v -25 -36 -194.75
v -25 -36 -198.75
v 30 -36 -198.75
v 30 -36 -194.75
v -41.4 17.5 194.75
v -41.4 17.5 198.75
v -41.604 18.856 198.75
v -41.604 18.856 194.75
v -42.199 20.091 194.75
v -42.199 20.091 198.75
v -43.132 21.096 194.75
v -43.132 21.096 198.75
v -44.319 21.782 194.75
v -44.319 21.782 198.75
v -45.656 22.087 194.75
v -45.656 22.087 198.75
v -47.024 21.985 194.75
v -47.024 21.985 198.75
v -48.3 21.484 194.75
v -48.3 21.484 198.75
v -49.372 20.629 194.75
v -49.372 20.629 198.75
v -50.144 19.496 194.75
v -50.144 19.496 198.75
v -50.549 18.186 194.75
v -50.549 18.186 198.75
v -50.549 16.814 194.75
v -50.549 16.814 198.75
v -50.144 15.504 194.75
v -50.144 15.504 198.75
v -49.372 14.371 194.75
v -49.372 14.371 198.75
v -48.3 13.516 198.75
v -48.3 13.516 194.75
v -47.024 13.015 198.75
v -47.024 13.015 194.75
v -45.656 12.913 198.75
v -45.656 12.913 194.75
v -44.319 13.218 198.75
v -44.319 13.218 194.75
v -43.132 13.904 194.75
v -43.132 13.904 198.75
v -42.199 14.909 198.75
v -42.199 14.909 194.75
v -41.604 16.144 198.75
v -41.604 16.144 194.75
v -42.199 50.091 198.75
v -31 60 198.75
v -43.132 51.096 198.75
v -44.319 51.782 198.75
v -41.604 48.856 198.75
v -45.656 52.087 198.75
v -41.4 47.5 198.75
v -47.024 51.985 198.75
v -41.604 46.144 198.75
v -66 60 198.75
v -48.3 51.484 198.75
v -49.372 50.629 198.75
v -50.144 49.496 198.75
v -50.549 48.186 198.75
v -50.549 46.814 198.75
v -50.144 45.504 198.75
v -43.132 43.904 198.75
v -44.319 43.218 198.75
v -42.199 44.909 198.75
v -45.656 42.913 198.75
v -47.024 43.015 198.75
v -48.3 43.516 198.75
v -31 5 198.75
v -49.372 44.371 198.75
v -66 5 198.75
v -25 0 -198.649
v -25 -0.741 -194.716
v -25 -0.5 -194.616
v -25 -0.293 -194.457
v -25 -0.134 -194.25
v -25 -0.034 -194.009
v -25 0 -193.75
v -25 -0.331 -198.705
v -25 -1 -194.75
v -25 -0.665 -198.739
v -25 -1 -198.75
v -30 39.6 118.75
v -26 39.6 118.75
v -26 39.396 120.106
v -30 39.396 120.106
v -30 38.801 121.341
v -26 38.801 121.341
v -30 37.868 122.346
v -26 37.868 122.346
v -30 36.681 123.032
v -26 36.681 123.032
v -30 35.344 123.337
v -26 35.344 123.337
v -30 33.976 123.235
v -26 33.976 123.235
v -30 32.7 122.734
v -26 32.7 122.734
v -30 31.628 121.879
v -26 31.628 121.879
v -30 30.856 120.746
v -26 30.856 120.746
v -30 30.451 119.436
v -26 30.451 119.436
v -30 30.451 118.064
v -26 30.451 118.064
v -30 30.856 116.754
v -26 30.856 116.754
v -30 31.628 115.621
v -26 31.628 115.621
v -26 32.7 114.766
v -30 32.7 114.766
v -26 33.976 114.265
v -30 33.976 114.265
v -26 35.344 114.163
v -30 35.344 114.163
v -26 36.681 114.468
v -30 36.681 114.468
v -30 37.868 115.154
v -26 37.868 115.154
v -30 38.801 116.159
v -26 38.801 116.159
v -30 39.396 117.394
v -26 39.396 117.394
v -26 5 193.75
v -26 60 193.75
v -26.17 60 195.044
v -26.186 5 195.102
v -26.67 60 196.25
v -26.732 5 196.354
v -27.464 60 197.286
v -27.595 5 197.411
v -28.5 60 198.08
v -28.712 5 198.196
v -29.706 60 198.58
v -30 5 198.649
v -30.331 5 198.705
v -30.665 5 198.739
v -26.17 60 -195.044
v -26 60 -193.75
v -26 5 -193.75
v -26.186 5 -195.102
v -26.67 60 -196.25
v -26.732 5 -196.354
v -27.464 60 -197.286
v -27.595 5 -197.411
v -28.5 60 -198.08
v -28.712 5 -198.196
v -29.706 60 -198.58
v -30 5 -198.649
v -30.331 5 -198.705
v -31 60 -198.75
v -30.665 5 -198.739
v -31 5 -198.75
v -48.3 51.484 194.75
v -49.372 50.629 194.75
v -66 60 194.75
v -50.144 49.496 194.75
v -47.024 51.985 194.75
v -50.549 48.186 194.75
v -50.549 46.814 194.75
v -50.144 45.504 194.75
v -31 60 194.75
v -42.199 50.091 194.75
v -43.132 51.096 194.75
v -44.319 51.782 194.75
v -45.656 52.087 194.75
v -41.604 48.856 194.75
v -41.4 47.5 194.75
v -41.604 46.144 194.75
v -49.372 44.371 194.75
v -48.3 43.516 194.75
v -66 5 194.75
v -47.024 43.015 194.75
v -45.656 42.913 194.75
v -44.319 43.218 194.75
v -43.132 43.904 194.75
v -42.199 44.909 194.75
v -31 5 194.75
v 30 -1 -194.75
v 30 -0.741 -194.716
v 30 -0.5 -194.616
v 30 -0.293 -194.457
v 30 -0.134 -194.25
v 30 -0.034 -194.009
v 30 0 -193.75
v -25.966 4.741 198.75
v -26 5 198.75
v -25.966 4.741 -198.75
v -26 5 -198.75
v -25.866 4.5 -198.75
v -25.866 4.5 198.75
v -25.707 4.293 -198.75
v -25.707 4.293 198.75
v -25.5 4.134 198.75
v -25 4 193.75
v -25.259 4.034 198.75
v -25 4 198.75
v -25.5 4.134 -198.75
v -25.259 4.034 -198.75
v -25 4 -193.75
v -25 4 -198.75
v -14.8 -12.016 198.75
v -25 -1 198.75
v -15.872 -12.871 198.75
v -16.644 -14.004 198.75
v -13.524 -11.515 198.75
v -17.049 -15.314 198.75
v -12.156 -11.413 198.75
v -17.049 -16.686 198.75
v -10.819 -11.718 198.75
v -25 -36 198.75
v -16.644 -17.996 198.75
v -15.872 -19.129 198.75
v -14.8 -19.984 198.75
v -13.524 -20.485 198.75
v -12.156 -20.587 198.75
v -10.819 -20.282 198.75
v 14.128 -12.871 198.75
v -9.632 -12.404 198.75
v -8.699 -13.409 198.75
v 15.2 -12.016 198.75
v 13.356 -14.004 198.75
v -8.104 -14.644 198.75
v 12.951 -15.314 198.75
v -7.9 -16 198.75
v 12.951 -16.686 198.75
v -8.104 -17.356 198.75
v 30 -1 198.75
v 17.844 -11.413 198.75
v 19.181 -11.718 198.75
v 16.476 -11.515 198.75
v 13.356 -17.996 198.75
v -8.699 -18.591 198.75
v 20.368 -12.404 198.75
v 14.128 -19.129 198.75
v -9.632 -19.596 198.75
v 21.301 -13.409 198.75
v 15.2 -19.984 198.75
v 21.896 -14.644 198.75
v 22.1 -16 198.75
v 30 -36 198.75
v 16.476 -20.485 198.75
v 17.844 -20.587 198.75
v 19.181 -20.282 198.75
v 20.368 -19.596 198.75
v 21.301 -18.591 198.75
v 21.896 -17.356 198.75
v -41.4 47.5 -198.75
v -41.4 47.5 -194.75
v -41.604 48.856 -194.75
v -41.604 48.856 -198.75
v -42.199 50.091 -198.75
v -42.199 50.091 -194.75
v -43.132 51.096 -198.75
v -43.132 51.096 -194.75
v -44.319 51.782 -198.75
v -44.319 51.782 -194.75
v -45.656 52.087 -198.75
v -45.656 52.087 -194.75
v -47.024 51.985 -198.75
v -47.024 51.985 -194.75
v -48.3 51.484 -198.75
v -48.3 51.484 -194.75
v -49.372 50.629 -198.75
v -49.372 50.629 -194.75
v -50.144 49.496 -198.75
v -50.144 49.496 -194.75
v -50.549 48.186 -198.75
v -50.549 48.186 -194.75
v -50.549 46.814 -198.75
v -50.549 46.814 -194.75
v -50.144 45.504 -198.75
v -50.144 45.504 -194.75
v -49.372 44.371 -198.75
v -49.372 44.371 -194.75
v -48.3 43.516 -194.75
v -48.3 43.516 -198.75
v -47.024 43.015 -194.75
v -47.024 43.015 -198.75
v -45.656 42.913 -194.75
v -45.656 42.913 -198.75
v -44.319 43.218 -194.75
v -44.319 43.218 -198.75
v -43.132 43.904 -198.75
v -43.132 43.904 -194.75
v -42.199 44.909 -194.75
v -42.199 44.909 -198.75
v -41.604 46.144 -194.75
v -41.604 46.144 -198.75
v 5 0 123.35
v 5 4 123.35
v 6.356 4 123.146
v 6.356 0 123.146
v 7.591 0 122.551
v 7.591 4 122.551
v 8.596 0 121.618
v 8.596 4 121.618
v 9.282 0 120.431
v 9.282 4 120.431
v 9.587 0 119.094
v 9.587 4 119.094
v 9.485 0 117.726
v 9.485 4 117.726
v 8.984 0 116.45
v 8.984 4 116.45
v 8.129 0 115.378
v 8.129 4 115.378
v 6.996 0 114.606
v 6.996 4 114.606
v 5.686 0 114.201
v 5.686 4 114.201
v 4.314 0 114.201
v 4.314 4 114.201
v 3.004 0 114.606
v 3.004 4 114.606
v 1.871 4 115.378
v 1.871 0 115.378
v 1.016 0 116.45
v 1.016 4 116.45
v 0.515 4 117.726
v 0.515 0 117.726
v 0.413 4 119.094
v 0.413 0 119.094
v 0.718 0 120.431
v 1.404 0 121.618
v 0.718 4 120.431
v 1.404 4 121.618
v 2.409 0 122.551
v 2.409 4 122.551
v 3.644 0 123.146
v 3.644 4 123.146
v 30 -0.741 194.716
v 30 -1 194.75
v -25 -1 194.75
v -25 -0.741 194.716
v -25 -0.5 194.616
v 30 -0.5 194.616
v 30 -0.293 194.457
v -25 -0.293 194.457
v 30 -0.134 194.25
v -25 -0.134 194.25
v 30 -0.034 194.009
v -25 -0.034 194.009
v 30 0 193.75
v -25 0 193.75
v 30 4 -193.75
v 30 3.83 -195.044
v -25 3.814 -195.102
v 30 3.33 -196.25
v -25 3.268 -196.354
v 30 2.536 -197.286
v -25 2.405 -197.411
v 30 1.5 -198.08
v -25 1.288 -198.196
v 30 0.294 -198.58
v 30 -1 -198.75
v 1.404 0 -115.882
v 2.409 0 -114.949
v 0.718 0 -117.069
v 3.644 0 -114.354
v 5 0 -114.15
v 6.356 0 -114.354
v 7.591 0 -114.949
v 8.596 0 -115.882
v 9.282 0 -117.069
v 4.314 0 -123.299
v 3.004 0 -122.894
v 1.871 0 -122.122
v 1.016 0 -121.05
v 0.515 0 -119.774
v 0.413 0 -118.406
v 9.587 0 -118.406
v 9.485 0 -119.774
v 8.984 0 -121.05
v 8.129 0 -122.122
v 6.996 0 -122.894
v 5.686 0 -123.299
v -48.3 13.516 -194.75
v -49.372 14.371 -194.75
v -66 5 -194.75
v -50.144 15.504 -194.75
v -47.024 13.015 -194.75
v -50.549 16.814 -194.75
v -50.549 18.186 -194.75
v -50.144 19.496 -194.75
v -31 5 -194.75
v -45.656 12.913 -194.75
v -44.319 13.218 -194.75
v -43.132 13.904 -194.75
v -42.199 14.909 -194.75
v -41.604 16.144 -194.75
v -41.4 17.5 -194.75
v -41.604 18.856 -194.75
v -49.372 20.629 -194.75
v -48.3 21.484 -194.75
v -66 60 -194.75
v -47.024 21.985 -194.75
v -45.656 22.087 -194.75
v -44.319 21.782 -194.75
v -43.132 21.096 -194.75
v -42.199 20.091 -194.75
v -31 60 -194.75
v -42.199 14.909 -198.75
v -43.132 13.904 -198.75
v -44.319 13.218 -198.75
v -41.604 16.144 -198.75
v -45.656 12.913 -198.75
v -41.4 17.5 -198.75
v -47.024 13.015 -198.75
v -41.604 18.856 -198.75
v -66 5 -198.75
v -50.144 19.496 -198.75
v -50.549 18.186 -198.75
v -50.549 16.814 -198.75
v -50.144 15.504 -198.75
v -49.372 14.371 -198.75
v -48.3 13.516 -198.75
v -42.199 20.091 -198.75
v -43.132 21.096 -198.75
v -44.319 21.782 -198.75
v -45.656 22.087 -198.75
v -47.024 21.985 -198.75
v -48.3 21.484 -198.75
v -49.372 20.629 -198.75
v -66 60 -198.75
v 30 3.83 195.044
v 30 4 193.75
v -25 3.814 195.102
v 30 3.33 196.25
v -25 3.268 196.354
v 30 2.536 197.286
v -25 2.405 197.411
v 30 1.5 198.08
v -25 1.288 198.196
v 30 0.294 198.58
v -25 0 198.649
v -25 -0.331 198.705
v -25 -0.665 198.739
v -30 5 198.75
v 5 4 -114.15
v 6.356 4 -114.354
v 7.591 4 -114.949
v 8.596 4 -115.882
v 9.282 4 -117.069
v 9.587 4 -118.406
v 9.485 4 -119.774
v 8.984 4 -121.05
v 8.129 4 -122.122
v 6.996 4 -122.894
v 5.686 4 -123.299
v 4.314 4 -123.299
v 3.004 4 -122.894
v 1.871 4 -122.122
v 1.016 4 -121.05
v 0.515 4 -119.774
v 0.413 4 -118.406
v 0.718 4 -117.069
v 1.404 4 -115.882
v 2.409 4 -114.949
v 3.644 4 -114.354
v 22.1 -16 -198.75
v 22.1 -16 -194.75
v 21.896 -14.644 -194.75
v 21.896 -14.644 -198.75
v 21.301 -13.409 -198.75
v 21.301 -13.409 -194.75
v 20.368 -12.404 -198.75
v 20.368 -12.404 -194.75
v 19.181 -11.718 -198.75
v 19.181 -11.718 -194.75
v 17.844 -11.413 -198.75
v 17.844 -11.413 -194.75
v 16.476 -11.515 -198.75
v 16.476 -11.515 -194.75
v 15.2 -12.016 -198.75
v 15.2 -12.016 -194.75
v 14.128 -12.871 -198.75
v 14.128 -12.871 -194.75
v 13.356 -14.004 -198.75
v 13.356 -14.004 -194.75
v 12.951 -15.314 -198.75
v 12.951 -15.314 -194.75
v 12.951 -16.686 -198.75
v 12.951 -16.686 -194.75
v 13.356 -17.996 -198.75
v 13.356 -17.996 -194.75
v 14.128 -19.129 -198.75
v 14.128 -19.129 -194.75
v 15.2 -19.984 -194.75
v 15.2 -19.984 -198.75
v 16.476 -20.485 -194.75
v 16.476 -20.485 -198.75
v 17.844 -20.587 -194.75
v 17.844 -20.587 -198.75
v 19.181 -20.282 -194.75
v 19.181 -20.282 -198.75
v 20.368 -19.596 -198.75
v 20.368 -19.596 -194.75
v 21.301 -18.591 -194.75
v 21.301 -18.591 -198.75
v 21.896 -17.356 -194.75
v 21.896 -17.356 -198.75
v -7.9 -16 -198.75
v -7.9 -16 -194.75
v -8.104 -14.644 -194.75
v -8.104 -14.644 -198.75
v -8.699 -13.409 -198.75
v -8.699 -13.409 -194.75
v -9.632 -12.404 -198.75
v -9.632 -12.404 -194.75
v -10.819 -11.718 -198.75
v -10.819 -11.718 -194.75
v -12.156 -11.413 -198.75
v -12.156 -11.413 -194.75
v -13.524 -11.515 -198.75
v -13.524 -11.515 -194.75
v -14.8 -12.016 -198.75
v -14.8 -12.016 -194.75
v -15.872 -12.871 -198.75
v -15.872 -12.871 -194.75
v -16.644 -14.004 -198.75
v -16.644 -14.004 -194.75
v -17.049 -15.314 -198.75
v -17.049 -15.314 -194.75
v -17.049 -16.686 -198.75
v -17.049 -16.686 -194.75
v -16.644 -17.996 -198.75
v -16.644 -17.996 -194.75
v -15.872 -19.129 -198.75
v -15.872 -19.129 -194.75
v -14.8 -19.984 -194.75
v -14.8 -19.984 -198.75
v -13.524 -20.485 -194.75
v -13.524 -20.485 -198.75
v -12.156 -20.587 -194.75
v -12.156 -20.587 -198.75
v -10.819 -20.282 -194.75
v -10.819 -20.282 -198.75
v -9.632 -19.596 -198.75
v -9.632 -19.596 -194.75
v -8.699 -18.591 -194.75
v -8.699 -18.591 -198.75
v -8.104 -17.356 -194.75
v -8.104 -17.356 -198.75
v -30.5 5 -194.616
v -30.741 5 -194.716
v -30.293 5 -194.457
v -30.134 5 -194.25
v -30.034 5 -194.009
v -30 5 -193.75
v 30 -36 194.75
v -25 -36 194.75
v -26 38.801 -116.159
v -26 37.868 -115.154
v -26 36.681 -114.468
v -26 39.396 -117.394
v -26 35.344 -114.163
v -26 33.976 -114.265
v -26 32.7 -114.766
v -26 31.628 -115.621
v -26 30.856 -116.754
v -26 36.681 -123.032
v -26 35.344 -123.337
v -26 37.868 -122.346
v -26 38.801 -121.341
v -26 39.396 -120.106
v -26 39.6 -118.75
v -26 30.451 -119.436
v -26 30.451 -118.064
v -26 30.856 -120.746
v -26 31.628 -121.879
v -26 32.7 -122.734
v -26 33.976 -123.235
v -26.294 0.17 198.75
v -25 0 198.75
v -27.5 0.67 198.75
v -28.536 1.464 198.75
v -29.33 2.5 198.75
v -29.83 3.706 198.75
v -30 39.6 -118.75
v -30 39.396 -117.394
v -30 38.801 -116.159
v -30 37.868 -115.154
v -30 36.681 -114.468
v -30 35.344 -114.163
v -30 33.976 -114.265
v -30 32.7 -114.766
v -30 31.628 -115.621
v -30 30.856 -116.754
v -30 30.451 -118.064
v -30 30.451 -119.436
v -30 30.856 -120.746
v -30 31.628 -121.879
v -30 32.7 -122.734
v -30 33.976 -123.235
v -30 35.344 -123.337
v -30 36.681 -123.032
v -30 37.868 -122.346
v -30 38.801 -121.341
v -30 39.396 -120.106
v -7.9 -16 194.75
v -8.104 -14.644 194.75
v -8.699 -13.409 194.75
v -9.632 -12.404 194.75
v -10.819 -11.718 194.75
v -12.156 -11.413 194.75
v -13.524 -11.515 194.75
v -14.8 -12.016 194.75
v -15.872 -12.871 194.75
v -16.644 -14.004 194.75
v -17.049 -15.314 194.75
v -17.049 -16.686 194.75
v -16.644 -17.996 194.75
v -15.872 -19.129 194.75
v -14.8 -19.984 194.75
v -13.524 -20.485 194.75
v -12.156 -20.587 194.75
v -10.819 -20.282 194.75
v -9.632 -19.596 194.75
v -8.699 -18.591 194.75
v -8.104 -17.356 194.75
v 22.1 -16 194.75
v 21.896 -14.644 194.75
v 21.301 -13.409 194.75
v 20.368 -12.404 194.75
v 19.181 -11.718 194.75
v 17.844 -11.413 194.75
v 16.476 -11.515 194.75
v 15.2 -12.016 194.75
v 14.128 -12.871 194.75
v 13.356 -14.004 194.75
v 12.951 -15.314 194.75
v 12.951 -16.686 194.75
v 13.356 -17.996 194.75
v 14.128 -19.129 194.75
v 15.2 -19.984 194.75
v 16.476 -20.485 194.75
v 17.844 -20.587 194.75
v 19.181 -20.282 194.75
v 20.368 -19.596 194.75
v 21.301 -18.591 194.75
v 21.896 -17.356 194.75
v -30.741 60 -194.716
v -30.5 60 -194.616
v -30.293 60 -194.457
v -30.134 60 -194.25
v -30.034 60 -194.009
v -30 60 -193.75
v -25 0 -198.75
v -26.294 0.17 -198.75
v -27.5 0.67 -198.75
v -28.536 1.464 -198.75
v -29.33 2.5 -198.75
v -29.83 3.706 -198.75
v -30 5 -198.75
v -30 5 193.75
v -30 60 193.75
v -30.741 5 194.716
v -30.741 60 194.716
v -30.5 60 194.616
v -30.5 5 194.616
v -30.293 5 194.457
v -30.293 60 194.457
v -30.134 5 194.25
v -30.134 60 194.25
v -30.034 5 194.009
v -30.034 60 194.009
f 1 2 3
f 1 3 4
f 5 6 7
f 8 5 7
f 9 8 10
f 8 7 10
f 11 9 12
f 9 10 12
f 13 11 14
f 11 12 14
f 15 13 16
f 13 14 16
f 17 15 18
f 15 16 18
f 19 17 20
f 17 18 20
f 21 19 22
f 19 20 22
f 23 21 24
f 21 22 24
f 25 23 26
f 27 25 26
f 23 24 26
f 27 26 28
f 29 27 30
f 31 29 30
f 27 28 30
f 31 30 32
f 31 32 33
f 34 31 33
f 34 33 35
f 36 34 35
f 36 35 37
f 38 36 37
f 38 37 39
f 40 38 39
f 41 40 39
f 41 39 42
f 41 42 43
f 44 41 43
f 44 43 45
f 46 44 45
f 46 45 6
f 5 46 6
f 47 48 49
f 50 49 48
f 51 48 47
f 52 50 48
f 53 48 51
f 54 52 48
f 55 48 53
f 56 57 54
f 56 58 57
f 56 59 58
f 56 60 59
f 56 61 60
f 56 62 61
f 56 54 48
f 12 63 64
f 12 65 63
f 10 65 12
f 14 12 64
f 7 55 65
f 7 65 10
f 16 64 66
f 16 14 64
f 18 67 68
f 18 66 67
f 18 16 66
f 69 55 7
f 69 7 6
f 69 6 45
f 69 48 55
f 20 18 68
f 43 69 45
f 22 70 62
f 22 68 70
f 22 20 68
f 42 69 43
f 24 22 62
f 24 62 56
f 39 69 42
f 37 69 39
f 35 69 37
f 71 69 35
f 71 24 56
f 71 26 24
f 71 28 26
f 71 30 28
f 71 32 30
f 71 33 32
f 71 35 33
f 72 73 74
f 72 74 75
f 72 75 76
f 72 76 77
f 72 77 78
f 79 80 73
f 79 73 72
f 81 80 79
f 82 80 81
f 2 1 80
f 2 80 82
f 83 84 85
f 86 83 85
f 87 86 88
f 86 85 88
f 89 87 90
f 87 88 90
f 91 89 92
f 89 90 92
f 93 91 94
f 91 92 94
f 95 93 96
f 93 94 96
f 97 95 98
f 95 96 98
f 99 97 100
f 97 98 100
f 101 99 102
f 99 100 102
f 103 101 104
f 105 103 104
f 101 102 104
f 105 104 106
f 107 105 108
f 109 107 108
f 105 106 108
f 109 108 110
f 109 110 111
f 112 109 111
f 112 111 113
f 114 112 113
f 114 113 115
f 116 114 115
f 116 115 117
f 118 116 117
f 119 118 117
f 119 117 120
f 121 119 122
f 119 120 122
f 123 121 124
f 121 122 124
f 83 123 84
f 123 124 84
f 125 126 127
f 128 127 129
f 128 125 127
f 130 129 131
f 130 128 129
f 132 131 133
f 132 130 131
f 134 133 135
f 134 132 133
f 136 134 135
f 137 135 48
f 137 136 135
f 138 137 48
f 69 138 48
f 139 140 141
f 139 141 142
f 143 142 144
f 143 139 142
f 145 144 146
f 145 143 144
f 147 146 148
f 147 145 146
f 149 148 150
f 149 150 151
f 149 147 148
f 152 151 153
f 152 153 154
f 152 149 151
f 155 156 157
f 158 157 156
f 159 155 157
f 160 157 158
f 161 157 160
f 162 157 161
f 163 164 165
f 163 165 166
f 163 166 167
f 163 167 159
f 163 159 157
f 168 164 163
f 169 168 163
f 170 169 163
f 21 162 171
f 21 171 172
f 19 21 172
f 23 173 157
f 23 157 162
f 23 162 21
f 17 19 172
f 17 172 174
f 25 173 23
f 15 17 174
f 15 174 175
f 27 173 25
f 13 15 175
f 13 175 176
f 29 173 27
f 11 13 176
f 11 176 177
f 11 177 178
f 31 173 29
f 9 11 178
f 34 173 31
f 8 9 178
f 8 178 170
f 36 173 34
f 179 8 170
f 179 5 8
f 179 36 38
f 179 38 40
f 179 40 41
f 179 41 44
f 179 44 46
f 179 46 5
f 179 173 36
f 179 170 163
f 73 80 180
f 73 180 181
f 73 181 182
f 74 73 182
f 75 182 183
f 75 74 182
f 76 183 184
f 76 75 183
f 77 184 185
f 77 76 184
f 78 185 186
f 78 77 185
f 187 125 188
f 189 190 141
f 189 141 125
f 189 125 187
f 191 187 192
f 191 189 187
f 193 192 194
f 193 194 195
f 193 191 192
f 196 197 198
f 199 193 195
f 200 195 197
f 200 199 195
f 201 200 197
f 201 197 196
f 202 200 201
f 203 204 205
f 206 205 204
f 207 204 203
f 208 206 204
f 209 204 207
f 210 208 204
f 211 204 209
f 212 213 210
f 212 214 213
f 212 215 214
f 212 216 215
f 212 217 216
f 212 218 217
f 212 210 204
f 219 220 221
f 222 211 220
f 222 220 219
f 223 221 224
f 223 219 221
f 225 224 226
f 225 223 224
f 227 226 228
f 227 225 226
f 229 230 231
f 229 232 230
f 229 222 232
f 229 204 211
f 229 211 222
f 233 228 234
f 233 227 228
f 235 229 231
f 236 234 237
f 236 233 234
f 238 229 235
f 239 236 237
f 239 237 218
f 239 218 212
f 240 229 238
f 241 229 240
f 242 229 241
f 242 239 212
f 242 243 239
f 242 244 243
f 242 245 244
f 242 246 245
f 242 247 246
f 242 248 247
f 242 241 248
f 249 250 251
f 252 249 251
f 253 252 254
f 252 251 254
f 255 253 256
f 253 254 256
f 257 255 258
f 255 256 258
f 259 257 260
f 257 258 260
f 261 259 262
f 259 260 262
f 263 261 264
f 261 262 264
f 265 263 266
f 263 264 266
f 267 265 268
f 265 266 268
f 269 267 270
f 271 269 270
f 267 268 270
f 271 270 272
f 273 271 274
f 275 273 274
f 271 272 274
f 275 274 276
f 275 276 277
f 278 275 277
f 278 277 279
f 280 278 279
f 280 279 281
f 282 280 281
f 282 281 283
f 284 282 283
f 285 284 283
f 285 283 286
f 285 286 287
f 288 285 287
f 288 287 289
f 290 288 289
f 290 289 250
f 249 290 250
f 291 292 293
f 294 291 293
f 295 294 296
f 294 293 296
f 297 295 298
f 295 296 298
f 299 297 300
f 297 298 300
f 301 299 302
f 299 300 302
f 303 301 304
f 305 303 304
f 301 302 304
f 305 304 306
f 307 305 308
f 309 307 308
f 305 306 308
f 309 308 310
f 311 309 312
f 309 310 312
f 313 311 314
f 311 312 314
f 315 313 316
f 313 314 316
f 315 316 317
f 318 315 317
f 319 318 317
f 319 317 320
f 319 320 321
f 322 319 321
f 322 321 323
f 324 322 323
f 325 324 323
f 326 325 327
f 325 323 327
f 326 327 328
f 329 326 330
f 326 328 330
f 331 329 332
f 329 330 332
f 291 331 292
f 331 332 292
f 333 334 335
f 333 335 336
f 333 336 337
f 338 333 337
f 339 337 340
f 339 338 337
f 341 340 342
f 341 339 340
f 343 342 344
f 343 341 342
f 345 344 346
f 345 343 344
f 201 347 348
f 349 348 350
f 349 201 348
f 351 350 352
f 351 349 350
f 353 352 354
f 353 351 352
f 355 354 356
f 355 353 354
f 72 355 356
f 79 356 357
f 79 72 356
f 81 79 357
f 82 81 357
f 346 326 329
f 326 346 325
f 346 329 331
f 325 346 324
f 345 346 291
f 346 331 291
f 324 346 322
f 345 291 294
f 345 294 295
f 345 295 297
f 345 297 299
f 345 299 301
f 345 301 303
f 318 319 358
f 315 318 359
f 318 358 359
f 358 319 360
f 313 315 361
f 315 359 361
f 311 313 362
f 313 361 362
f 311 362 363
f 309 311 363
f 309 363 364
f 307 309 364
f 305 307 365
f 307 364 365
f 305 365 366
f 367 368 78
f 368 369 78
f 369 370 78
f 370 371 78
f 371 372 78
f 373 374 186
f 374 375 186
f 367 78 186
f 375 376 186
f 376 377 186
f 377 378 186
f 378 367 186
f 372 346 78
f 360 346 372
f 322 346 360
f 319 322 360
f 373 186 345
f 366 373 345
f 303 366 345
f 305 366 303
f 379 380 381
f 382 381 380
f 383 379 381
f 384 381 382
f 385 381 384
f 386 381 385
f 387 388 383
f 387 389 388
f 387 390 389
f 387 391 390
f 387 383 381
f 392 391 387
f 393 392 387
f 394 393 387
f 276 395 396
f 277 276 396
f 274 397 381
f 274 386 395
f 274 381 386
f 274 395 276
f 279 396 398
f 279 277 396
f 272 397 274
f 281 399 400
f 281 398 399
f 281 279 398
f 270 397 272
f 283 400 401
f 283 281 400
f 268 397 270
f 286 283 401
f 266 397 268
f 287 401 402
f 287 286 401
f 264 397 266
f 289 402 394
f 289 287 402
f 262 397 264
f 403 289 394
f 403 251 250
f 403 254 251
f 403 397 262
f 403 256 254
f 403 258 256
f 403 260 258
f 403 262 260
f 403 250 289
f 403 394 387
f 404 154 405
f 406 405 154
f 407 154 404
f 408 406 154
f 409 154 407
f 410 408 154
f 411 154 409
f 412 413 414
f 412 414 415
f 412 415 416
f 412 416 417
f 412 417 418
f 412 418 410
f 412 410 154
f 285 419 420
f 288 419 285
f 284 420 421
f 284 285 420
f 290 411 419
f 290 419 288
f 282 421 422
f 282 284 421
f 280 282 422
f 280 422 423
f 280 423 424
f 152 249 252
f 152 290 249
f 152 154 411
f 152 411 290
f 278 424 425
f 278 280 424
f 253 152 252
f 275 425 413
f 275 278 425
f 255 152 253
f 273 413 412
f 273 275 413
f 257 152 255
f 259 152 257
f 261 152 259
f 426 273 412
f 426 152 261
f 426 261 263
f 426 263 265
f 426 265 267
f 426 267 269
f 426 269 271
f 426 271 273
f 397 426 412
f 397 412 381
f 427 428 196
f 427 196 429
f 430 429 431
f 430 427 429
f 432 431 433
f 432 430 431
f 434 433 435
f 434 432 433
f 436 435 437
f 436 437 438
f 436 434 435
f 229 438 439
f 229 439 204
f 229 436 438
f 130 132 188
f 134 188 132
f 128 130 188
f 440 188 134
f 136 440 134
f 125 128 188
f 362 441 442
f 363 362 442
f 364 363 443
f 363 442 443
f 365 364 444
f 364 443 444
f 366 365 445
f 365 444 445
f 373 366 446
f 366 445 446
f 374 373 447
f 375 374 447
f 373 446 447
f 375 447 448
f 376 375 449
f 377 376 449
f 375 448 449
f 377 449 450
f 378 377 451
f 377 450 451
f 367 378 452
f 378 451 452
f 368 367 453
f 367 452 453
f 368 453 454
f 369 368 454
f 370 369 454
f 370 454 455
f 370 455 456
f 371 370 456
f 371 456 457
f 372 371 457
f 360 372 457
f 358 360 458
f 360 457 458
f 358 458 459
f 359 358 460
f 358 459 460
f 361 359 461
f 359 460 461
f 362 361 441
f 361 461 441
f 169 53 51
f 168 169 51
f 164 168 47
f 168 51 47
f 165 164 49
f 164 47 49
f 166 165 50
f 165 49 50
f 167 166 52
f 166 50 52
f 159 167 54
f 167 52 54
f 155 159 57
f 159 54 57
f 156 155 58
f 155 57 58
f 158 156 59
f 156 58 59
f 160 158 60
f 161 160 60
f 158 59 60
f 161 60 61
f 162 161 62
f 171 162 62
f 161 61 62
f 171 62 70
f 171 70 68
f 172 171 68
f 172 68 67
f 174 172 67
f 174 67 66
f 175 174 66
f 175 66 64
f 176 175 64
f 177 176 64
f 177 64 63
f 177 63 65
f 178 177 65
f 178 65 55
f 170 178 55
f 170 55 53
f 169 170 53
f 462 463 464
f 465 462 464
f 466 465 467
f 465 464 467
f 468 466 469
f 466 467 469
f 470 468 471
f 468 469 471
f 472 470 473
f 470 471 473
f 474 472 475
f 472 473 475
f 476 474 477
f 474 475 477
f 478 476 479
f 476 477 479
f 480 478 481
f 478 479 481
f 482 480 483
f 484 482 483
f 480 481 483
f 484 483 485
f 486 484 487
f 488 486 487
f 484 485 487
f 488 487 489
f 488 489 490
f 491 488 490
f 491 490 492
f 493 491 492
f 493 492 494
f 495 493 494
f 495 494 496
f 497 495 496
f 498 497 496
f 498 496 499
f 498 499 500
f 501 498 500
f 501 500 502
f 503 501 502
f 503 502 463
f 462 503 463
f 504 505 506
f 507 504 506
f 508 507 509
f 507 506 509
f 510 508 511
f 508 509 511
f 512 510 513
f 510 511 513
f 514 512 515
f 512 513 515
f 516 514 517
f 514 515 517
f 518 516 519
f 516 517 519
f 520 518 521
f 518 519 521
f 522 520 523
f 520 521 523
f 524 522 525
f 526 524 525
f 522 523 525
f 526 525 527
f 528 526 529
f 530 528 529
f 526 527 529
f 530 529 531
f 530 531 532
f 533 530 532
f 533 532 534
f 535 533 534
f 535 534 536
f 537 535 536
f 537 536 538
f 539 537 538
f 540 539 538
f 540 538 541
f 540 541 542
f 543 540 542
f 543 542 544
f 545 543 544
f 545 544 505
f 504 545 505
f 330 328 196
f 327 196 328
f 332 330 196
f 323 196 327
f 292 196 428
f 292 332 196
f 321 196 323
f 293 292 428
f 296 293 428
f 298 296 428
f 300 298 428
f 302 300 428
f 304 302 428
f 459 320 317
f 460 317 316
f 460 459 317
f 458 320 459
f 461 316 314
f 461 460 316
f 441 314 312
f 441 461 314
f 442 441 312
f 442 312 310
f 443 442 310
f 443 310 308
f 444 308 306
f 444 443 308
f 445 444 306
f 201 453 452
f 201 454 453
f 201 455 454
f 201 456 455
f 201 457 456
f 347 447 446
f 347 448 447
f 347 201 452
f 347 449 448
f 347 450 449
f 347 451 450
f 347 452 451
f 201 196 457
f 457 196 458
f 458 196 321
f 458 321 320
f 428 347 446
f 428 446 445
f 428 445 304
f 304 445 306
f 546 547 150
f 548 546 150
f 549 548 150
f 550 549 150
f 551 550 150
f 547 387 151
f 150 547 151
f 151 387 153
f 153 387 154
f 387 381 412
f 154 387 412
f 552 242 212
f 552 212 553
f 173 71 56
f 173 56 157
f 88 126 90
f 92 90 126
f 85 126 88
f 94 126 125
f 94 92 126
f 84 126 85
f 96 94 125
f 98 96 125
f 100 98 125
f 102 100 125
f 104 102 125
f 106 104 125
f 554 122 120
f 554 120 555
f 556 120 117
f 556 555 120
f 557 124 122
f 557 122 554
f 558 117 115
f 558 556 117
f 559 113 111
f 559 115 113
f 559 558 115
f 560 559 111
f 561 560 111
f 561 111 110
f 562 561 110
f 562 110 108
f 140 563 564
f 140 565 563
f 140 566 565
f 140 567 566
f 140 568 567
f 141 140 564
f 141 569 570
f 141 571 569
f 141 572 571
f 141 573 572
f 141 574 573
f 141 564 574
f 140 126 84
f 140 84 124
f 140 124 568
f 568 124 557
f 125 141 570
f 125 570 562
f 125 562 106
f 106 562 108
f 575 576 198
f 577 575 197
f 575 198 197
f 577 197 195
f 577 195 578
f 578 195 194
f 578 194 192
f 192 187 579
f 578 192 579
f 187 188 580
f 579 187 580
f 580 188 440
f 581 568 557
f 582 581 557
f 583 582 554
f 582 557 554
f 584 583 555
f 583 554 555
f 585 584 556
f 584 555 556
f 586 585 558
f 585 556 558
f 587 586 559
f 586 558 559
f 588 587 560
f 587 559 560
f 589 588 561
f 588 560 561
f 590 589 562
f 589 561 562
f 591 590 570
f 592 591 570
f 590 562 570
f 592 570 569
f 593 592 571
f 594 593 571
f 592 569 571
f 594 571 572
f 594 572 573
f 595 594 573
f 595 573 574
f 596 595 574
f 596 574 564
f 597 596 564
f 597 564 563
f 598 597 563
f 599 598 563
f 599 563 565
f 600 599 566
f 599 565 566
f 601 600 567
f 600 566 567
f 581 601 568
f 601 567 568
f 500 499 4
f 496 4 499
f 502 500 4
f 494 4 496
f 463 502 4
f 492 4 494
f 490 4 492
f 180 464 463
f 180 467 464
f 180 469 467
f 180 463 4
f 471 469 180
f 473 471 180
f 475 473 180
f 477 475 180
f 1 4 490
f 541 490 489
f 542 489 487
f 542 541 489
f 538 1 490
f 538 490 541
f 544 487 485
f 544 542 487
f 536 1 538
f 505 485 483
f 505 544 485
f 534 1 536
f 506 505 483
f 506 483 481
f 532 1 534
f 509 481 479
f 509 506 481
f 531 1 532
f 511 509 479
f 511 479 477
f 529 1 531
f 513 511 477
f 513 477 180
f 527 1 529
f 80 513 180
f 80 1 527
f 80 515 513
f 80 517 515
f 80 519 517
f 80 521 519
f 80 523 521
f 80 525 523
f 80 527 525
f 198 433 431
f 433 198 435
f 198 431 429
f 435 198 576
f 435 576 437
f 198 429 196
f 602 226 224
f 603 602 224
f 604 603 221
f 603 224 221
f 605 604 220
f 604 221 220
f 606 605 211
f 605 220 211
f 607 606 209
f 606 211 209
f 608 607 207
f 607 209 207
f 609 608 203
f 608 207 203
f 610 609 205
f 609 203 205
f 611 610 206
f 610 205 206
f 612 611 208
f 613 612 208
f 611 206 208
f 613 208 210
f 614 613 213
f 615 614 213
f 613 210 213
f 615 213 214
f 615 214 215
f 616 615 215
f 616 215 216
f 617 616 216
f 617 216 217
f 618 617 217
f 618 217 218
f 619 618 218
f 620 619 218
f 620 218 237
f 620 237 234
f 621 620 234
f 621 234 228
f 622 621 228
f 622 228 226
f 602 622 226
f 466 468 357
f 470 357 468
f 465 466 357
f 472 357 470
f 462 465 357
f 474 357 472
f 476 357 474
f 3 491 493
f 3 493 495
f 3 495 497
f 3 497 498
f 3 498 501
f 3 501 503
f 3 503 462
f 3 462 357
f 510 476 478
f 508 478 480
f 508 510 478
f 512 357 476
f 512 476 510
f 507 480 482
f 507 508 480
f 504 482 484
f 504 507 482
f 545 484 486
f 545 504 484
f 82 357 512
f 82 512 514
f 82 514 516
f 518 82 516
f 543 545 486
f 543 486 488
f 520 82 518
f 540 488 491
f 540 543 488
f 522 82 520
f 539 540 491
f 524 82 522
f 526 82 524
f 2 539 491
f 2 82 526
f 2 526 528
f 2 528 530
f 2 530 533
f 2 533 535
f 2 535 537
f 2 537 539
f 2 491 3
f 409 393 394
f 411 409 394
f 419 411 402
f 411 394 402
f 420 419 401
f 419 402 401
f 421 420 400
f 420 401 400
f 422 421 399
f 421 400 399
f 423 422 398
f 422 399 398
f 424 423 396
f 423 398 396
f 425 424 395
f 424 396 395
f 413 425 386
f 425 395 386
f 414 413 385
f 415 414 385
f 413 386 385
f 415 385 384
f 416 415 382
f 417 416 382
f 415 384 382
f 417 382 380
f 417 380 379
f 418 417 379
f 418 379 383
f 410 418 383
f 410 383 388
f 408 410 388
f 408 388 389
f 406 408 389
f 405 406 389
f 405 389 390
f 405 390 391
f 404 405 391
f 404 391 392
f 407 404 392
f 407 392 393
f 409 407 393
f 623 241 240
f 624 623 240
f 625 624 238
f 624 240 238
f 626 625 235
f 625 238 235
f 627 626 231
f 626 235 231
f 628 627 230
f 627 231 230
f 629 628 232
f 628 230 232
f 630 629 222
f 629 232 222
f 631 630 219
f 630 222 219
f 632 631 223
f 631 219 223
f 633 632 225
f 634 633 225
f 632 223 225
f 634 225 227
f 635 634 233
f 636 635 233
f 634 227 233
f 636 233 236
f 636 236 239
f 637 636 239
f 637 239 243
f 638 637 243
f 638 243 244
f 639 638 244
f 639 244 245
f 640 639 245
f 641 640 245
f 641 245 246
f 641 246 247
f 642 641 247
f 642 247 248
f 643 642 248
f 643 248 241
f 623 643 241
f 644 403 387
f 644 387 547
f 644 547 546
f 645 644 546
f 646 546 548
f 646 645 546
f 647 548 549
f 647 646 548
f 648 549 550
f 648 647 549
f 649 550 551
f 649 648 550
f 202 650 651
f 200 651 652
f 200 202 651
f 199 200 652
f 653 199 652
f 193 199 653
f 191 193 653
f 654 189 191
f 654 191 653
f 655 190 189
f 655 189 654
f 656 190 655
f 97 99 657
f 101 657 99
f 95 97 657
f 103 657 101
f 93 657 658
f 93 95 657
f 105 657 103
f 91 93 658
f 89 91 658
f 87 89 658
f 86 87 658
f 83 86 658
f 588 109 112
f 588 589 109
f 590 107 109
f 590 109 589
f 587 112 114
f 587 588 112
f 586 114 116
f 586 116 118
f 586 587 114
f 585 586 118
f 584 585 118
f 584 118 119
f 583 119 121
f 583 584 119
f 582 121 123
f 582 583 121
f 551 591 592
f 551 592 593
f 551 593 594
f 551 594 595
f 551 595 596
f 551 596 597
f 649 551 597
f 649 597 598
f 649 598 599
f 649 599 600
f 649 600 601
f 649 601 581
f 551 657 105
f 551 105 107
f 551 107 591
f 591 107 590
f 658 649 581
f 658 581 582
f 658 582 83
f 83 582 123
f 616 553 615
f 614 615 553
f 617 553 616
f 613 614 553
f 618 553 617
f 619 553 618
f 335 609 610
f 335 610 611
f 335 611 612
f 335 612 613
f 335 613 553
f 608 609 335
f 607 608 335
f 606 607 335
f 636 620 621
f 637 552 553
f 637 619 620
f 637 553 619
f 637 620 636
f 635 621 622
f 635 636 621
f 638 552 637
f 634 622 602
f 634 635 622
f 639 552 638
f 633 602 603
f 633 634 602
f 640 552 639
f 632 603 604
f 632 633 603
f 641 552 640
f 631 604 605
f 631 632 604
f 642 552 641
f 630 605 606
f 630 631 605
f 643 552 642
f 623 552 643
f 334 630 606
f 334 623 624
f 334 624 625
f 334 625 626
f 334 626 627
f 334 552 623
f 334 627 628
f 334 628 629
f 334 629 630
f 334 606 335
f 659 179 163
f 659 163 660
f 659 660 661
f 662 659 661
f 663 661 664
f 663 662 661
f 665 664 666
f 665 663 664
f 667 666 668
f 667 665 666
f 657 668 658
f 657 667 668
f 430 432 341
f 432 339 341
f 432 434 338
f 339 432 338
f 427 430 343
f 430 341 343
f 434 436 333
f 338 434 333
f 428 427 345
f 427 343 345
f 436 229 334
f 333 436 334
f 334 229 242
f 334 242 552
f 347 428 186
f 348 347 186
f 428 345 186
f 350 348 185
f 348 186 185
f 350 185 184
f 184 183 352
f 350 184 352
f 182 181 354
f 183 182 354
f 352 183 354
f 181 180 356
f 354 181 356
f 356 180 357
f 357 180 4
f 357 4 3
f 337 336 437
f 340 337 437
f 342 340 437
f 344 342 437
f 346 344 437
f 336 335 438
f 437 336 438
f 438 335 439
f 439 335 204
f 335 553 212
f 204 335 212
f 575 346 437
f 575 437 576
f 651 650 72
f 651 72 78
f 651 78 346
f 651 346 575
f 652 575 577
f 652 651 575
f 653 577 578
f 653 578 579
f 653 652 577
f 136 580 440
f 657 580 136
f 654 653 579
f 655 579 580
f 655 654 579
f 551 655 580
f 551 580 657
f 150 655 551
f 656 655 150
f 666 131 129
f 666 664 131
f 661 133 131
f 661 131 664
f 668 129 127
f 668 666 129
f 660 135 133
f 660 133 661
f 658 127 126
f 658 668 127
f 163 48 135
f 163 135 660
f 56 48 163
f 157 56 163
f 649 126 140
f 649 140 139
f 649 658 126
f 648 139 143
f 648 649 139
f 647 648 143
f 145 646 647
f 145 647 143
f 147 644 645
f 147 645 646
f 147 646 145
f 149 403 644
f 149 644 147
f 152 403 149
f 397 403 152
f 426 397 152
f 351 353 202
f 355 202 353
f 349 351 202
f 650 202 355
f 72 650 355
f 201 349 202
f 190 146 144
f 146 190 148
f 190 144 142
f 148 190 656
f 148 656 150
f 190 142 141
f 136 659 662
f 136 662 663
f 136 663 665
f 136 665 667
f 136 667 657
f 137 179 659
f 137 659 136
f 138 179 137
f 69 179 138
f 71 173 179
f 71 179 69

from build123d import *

# Parameters (mm, degrees)
SKETCH1_W                      = 60
SKETCH1_H                      = 397.5
BASE_FLANGE1_DEPTH             = 4
EDGE_FLANGE1_STRIP_W           = 18
EDGE_FLANGE1_STRIP_H           = 4
EDGE_FLANGE1_STRIP_CUT_DEPTH   = 397.5
EDGE_FLANGE1_DEPTH             = 397.5
EDGE_FLANGE2_STRIP_W           = 18
EDGE_FLANGE2_STRIP_H           = 4
EDGE_FLANGE2_STRIP_CUT_DEPTH   = 55
EDGE_FLANGE2_STRIP_2_W         = 18
EDGE_FLANGE2_STRIP_2_H         = 4
EDGE_FLANGE2_STRIP_CUT_2_DEPTH = 55
EDGE_FLANGE2_STRIP_3_W         = 18
EDGE_FLANGE2_STRIP_3_H         = 4
EDGE_FLANGE2_STRIP_CUT_3_DEPTH = 55
EDGE_FLANGE2_STRIP_4_W         = 18
EDGE_FLANGE2_STRIP_4_H         = 4
EDGE_FLANGE2_STRIP_CUT_4_DEPTH = 55
EDGE_FLANGE2_DEPTH             = 55
EDGE_FLANGE2_BEND_DEPTH        = 55
EDGE_FLANGE2_BEND_2_DEPTH      = 55
EDGE_FLANGE2_BEND_3_DEPTH      = 55
SKETCH18_R                     = 4.6
EXTRUDE1_DEPTH                 = 408.38464625
SKETCH19_R                     = 4.6
EXTRUDE2_DEPTH                 = 4
SKETCH20_R                     = 4.6
EXTRUDE3_DEPTH                 = 4


# Sheet-metal steps are written as plain solids
with BuildPart() as part:
    # Sketch1 → Base-Flange1 (new body)
    with BuildSketch(Plane(origin=(0, 0, 0), x_dir=(1, 0, 0), z_dir=(0, 1, 0))):
        Rectangle(SKETCH1_W, SKETCH1_H)
    extrude(amount=BASE_FLANGE1_DEPTH)

    # Edge-Flange1 strip (across the edge) → Edge-Flange1 strip cut (cut)
    with BuildSketch(Plane(origin=(-30, 4, -198.75), x_dir=(1, 0, 0), z_dir=(0, 0, 1))):
        with Locations((-4, -2)):
            Rectangle(EDGE_FLANGE1_STRIP_W, EDGE_FLANGE1_STRIP_H)
    extrude(amount=EDGE_FLANGE1_STRIP_CUT_DEPTH, mode=Mode.SUBTRACT)

    # Edge-Flange1 section (across the edge) → Edge-Flange1 (add)
    with BuildSketch(Plane(origin=(-30, 4, -198.75), x_dir=(1, 0, 0), z_dir=(0, 0, 1))):
        with BuildLine():
            Line((0, 1), (0, 56))
            Line((0, 56), (4, 56))
            Line((4, 56), (4, 1))
            ThreePointArc((4, 1), (4.292893219, 0.292893219), (5, 0))
            Line((5, 0), (5, -4))
            ThreePointArc((5, -4), (1.464466094, -2.535533906), (0, 1))
        make_face()
    extrude(amount=EDGE_FLANGE1_DEPTH)

    # Edge-Flange2 strip (across the edge) → Edge-Flange2 strip cut (cut)
    with BuildSketch(Plane(origin=(-30, 5, 198.75), x_dir=(0, 0, -1), z_dir=(0, 1, 0))):
        with Locations((-4, -2)):
            Rectangle(EDGE_FLANGE2_STRIP_W, EDGE_FLANGE2_STRIP_H)
    extrude(amount=EDGE_FLANGE2_STRIP_CUT_DEPTH, mode=Mode.SUBTRACT)

    # Edge-Flange2 strip 2 (across the edge) → Edge-Flange2 strip cut 2 (cut)
    with BuildSketch(Plane(origin=(30, 0, 198.75), x_dir=(0, 0, -1), z_dir=(-1, 0, 0))):
        with Locations((-4, -2)):
            Rectangle(EDGE_FLANGE2_STRIP_2_W, EDGE_FLANGE2_STRIP_2_H)
    extrude(amount=EDGE_FLANGE2_STRIP_CUT_2_DEPTH, mode=Mode.SUBTRACT)

    # Edge-Flange2 strip 3 (across the edge) → Edge-Flange2 strip cut 3 (cut)
    with BuildSketch(Plane(origin=(-30, 60, -198.75), x_dir=(0, 0, 1), z_dir=(0, -1, 0))):
        with Locations((-4, -2)):
            Rectangle(EDGE_FLANGE2_STRIP_3_W, EDGE_FLANGE2_STRIP_3_H)
    extrude(amount=EDGE_FLANGE2_STRIP_CUT_3_DEPTH, mode=Mode.SUBTRACT)

    # Edge-Flange2 strip 4 (across the edge) → Edge-Flange2 strip cut 4 (cut)
    with BuildSketch(Plane(origin=(-25, 0, -198.75), x_dir=(0, 0, 1), z_dir=(1, 0, 0))):
        with Locations((-4, -2)):
            Rectangle(EDGE_FLANGE2_STRIP_4_W, EDGE_FLANGE2_STRIP_4_H)
    extrude(amount=EDGE_FLANGE2_STRIP_CUT_4_DEPTH, mode=Mode.SUBTRACT)

    # Edge-Flange2 section (across the edge) → Edge-Flange2 (add)
    with BuildSketch(Plane(origin=(-30, 5, 198.75), x_dir=(0, 0, -1), z_dir=(0, 1, 0))):
        with BuildLine():
            Line((0, 1), (0, 36))
            Line((0, 36), (4, 36))
            Line((4, 36), (4, 1))
            ThreePointArc((4, 1), (4.292893219, 0.292893219), (5, 0))
            Line((5, 0), (5, -4))
            ThreePointArc((5, -4), (1.464466094, -2.535533906), (0, 1))
        make_face()
    extrude(amount=EDGE_FLANGE2_DEPTH)

    # Edge-Flange2 section 2 (across the edge) → Edge-Flange2 bend (add)
    with BuildSketch(Plane(origin=(30, 0, 198.75), x_dir=(0, 0, -1), z_dir=(-1, 0, 0))):
        with BuildLine():
            Line((0, 1), (0, 36))
            Line((0, 36), (4, 36))
            Line((4, 36), (4, 1))
            ThreePointArc((4, 1), (4.292893219, 0.292893219), (5, 0))
            Line((5, 0), (5, -4))
            ThreePointArc((5, -4), (1.464466094, -2.535533906), (0, 1))
        make_face()
    extrude(amount=EDGE_FLANGE2_BEND_DEPTH)

    # Edge-Flange2 section 3 (across the edge) → Edge-Flange2 bend 2 (add)
    with BuildSketch(Plane(origin=(-30, 60, -198.75), x_dir=(0, 0, 1), z_dir=(0, -1, 0))):
        with BuildLine():
            Line((0, 1), (0, 36))
            Line((0, 36), (4, 36))
            Line((4, 36), (4, 1))
            ThreePointArc((4, 1), (4.292893219, 0.292893219), (5, 0))
            Line((5, 0), (5, -4))
            ThreePointArc((5, -4), (1.464466094, -2.535533906), (0, 1))
        make_face()
    extrude(amount=EDGE_FLANGE2_BEND_2_DEPTH)

    # Edge-Flange2 section 4 (across the edge) → Edge-Flange2 bend 3 (add)
    with BuildSketch(Plane(origin=(-25, 0, -198.75), x_dir=(0, 0, 1), z_dir=(1, 0, 0))):
        with BuildLine():
            Line((0, 1), (0, 36))
            Line((0, 36), (4, 36))
            Line((4, 36), (4, 1))
            ThreePointArc((4, 1), (4.292893219, 0.292893219), (5, 0))
            Line((5, 0), (5, -4))
            ThreePointArc((5, -4), (1.464466094, -2.535533906), (0, 1))
        make_face()
    extrude(amount=EDGE_FLANGE2_BEND_3_DEPTH)

    # Sketch18 → Extrude1 (cut, through all)
    with BuildSketch(Plane.XY.offset(198.75)):
        with Locations((-46, 47.5)):
            Circle(SKETCH18_R)
        with Locations((-46, 17.5)):
            Circle(SKETCH18_R)
        with Locations((-12.5, -16)):
            Circle(SKETCH18_R)
        with Locations((17.5, -16)):
            Circle(SKETCH18_R)
    extrude(amount=-EXTRUDE1_DEPTH, mode=Mode.SUBTRACT)

    # Sketch19 → Extrude2 (cut)
    with BuildSketch(Plane(origin=(-26, 0, 0), x_dir=(0, 0, -1), z_dir=(1, 0, 0))):
        with Locations(Location((-118.75, 35, 0), (0, 0, 90))):
            Circle(SKETCH19_R)
        with Locations(Location((118.75, 35, 0), (0, 0, 90))):
            Circle(SKETCH19_R)
    extrude(amount=-EXTRUDE2_DEPTH, mode=Mode.SUBTRACT)

    # Sketch20 → Extrude3 (cut)
    with BuildSketch(Plane(origin=(0, 4, 0), x_dir=(1, 0, 0), z_dir=(0, 1, 0))):
        with Locations(Location((5, 118.75, 0), (0, 0, 270))):
            Circle(SKETCH20_R)
        with Locations(Location((5, -118.75, 0), (0, 0, 270))):
            Circle(SKETCH20_R)
    extrude(amount=-EXTRUDE3_DEPTH, mode=Mode.SUBTRACT)


solid = part.part
